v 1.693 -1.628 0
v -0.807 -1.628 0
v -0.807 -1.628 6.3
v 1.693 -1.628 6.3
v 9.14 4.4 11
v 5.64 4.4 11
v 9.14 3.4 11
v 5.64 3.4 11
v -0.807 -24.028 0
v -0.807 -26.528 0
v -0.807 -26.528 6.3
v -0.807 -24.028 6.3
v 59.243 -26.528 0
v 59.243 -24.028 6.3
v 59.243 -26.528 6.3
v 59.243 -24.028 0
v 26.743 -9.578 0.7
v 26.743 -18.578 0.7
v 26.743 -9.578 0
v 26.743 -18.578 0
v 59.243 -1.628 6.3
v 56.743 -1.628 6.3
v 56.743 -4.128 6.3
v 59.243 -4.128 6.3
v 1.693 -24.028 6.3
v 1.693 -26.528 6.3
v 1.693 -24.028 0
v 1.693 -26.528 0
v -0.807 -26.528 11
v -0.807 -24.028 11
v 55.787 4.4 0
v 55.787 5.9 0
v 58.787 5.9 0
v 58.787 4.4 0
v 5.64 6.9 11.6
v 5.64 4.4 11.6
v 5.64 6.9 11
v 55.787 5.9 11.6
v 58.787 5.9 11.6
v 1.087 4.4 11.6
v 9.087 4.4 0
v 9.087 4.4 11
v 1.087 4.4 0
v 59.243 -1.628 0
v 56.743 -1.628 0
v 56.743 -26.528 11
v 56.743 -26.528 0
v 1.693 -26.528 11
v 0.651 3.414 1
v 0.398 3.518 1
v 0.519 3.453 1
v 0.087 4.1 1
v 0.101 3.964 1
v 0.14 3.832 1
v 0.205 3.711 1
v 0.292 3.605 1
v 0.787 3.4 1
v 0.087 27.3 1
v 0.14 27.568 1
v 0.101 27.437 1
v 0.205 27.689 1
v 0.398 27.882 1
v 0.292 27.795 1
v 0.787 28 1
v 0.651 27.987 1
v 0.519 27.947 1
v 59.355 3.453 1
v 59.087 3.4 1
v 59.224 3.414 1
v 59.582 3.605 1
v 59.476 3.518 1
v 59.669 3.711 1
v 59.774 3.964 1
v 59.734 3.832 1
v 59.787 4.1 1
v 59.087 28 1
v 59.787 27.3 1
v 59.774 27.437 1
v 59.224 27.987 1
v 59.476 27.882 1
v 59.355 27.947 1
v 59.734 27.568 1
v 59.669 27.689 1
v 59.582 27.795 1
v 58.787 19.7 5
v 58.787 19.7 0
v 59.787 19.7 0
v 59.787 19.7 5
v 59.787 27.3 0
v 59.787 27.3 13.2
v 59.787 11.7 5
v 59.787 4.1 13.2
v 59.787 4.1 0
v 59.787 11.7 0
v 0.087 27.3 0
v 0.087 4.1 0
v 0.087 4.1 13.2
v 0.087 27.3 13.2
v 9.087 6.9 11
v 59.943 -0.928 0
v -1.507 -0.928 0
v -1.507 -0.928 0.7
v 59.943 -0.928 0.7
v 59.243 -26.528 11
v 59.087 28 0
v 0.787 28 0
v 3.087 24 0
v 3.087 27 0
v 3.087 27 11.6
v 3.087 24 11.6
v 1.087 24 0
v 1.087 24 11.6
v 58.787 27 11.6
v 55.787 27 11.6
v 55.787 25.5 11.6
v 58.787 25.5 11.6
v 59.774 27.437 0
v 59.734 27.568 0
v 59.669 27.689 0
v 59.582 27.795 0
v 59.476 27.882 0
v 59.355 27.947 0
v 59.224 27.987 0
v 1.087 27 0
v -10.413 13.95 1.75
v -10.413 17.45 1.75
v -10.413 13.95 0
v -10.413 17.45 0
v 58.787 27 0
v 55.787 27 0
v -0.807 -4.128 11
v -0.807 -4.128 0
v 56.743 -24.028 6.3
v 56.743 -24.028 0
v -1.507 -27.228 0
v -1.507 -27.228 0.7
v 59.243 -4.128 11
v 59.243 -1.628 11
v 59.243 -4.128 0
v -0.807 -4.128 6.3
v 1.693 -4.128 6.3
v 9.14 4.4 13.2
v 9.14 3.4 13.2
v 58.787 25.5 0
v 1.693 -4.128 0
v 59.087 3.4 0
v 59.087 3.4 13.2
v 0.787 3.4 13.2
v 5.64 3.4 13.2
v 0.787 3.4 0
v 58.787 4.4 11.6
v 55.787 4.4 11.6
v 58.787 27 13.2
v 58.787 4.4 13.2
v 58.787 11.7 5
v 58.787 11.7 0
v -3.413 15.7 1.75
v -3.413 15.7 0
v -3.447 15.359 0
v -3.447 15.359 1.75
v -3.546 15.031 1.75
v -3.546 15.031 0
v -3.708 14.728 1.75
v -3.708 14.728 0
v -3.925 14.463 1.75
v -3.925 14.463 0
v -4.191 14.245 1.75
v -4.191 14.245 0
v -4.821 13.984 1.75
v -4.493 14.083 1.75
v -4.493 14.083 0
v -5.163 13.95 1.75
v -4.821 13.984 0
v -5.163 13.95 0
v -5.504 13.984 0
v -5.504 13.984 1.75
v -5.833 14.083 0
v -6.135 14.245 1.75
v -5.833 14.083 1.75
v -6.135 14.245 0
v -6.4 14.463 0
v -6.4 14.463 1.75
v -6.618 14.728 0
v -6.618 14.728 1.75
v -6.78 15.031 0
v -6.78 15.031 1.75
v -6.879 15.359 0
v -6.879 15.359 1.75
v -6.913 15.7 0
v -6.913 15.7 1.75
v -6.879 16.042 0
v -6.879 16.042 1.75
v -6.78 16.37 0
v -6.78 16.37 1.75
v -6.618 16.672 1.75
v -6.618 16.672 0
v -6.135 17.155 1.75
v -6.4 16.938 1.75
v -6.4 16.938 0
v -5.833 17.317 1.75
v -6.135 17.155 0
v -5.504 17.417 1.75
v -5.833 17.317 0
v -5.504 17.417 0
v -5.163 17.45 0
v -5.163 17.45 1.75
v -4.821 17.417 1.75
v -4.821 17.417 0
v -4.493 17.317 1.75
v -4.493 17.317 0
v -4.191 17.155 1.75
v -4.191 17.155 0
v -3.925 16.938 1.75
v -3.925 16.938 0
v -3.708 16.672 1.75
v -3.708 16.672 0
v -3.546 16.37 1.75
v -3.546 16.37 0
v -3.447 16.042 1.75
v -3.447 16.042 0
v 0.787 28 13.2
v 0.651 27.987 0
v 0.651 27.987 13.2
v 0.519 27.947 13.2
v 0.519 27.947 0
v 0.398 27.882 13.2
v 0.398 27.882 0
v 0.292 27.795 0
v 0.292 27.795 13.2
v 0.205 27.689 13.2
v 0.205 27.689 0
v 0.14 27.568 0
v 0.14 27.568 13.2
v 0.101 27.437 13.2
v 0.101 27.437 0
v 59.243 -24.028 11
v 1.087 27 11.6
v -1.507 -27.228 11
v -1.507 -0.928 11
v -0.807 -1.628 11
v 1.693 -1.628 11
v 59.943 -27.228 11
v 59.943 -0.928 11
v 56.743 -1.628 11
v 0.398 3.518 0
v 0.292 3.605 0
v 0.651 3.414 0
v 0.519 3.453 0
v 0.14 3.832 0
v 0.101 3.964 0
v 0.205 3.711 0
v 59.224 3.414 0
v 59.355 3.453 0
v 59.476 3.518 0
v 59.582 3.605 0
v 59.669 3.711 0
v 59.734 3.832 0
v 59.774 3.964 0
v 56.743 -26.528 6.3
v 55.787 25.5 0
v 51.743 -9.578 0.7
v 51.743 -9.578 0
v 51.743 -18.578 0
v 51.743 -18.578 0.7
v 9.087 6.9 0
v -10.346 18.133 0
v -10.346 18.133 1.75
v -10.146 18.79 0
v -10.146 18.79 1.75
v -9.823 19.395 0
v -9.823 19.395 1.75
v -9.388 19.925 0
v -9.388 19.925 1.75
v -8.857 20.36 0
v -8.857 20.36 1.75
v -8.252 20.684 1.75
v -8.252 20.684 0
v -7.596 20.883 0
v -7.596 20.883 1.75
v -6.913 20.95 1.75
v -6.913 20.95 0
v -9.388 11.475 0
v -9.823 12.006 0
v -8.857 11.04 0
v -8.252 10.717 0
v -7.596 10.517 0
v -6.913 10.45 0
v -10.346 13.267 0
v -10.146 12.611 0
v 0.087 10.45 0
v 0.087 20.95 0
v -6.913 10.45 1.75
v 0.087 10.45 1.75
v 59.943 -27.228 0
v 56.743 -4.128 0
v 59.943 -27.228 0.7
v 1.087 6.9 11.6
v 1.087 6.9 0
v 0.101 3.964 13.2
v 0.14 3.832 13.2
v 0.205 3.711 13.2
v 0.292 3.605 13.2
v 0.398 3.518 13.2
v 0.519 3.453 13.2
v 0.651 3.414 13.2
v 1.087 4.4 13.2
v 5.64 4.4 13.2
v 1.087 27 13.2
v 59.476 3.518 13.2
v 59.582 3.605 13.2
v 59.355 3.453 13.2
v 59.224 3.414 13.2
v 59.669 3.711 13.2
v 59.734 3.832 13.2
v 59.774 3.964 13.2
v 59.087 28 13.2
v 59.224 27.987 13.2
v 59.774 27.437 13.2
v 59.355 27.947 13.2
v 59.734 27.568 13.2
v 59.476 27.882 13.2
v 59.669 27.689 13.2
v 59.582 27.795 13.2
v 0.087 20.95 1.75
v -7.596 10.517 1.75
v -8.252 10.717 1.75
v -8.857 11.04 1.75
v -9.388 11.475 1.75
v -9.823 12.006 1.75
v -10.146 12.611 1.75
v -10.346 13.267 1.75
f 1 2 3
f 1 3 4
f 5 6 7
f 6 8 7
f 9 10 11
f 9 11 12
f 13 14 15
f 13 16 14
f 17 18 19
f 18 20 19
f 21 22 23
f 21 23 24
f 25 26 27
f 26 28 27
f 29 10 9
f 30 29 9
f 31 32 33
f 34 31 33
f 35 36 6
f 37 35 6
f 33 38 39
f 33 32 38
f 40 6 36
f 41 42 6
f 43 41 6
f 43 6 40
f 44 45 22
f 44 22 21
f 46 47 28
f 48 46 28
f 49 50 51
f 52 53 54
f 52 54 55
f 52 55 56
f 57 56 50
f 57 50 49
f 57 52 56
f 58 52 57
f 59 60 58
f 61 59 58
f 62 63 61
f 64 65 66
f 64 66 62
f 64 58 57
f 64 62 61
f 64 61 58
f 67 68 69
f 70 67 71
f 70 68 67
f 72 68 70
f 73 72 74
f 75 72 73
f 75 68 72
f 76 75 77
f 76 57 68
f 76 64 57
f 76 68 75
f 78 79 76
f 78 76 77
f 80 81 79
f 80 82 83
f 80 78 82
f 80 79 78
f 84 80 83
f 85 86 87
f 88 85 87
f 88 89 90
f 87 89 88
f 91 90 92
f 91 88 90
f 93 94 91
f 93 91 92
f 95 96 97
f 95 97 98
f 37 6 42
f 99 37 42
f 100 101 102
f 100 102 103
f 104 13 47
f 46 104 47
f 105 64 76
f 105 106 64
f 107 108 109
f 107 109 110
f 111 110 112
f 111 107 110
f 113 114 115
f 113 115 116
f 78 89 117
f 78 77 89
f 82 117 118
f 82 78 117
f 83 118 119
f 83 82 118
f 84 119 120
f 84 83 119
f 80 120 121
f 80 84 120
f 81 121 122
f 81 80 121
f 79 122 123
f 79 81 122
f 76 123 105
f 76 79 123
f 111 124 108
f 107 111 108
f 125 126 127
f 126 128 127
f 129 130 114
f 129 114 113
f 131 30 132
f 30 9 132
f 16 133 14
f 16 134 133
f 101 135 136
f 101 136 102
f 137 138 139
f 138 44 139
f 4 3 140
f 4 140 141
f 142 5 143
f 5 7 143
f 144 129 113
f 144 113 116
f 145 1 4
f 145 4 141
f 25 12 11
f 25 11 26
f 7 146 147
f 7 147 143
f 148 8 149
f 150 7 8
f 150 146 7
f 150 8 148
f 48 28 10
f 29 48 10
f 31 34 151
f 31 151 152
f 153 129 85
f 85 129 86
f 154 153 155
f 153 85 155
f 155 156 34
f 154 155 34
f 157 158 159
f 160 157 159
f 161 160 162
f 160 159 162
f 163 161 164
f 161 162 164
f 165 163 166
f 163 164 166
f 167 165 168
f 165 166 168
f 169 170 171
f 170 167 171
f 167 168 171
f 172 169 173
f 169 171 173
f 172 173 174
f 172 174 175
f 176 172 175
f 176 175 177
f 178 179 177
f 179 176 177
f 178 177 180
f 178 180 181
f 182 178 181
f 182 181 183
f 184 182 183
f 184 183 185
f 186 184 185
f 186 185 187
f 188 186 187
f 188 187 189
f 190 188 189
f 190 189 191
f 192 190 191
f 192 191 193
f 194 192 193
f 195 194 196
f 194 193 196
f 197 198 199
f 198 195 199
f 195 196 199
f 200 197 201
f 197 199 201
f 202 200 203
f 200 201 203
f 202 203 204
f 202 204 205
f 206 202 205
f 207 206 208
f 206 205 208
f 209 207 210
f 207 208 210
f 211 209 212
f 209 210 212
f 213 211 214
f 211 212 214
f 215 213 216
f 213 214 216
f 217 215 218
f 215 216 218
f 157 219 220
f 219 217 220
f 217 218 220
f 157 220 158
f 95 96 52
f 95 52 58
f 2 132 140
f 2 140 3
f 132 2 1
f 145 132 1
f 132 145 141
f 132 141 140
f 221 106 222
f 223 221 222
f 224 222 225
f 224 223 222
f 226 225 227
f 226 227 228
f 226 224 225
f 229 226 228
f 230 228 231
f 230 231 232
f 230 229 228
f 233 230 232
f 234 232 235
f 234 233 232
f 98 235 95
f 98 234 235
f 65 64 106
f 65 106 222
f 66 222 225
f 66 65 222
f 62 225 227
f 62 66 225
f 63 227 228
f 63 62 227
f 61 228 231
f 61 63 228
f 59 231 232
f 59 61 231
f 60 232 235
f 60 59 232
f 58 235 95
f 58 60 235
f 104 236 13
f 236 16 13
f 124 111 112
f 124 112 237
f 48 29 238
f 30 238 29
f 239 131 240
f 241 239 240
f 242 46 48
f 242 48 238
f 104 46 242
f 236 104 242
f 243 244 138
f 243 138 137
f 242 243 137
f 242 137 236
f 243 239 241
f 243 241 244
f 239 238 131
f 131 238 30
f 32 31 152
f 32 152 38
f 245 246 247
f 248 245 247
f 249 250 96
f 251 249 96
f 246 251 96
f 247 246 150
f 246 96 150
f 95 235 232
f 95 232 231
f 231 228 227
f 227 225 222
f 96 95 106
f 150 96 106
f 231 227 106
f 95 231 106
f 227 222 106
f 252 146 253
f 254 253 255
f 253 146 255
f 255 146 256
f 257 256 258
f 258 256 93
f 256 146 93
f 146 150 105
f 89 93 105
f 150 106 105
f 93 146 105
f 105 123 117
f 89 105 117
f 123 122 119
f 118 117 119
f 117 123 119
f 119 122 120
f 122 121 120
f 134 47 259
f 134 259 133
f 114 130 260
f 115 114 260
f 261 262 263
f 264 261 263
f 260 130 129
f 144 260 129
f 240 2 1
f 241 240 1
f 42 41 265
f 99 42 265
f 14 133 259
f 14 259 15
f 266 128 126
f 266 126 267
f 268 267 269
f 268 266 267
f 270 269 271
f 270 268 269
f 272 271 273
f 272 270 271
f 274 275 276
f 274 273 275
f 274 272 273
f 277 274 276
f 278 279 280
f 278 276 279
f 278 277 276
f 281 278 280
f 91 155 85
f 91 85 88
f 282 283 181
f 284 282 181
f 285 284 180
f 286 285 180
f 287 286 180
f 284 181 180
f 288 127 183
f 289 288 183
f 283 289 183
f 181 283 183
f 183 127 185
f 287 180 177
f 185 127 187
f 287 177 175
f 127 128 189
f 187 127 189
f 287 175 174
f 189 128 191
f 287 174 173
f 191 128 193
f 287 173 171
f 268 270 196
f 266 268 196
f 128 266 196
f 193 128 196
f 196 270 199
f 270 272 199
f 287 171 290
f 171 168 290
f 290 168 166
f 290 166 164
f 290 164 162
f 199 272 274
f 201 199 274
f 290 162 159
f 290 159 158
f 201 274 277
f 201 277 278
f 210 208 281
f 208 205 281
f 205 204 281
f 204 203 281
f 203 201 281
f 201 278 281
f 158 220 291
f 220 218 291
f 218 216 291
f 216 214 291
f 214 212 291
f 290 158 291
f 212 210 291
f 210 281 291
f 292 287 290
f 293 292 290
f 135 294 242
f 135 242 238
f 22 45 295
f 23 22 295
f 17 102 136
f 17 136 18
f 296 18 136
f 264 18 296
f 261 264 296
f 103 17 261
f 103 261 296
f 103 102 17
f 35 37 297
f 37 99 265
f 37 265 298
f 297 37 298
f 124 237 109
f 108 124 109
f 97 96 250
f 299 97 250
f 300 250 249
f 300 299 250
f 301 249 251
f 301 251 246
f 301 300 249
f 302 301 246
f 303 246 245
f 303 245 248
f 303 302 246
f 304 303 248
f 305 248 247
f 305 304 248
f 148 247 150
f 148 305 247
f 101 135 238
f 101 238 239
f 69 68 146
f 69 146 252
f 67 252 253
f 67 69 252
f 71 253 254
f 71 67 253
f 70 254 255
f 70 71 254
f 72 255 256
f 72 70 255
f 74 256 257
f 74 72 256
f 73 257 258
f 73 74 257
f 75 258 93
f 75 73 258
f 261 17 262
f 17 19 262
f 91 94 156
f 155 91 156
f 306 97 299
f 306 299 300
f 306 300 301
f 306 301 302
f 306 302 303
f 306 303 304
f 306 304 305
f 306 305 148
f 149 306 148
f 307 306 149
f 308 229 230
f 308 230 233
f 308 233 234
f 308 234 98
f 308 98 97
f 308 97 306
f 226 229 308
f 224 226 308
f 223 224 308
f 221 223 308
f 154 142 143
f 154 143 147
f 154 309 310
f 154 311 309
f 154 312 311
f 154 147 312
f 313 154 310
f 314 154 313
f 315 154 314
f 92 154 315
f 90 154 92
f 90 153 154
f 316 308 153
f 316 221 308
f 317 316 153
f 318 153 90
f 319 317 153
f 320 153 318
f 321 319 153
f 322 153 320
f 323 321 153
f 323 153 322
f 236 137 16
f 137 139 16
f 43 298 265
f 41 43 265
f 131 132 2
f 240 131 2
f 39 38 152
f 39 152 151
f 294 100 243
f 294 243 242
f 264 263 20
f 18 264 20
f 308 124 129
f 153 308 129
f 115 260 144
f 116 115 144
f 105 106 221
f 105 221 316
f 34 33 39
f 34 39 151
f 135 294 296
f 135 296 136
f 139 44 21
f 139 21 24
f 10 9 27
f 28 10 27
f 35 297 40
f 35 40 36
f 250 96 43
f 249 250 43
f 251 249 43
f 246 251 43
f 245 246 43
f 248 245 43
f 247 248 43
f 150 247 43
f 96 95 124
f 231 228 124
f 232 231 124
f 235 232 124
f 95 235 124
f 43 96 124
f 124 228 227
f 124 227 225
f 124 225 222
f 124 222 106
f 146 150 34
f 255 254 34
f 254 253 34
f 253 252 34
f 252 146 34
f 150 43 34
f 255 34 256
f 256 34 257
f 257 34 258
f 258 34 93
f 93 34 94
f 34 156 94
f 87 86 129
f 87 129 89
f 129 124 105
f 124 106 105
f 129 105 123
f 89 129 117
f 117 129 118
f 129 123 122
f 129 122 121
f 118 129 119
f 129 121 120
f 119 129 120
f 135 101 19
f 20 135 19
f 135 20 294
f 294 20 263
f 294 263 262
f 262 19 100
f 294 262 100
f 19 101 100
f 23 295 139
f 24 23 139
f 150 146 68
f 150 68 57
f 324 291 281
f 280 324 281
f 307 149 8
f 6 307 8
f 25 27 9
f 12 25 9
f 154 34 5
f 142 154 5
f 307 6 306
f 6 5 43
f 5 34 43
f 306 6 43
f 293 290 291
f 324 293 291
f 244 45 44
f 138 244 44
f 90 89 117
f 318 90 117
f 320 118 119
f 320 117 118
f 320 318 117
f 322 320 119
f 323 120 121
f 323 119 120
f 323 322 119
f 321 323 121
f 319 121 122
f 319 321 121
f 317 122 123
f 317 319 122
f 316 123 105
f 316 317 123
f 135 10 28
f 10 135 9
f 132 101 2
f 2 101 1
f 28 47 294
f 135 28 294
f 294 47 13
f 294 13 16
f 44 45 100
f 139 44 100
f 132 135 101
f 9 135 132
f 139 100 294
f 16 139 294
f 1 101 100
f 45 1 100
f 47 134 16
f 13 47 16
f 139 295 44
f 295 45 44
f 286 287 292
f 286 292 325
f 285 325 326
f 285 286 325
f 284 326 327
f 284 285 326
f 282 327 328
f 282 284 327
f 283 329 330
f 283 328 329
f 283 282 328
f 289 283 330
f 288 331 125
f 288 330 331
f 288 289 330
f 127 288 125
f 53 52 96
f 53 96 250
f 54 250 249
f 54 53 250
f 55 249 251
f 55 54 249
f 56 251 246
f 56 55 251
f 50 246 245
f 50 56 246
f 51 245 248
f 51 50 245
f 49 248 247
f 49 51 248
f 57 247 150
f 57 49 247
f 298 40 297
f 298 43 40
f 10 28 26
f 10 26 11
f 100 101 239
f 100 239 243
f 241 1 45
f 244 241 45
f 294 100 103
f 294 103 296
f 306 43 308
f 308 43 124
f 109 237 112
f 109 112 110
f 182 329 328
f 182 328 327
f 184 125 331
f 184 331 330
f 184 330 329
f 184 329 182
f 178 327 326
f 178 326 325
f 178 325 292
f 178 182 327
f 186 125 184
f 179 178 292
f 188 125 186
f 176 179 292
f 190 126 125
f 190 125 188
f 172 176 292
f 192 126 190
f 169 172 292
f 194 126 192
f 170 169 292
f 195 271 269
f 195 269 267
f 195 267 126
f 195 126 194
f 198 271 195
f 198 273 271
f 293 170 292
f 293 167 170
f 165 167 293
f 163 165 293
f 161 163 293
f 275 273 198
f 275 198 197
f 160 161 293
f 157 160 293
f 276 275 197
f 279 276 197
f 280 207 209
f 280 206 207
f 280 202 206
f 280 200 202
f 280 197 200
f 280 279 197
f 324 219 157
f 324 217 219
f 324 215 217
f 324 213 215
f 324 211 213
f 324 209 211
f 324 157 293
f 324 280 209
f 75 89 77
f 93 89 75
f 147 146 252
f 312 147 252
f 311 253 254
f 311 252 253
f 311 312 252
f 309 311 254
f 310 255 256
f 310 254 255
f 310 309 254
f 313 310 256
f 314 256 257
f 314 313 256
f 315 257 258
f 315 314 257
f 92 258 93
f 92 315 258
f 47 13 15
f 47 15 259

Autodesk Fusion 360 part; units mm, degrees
sketch "Skizze1" plane through (0, 0, 0) normal (0, 0, 1) x (1, 0, 0)
  line L0 (0.0871, 28.0002) -> (59.7871, 28.0002)
  line L1 (59.7871, 28.0002) -> (59.7871, 3.4002)
  line L2 (59.7871, 3.4002) -> (0.0871, 3.4002)
  line L3 (0.0871, 3.4002) -> (0.0871, 28.0002)
  line L4 (58.7871, 4.4002) -> (1.0871, 4.4002)
  line L5 (1.0871, 4.4002) -> (1.0871, 27.0002)
  line L6 (1.0871, 27.0002) -> (58.7871, 27.0002)
  line L7 (58.7871, 27.0002) -> (58.7871, 4.4002)
  line L8 (1.0871, 27.0002) -> (3.0871, 27.0002)
  line L9 (3.0871, 27.0002) -> (3.0871, 24.0002)
  line L10 (3.0871, 24.0002) -> (1.0871, 24.0002)
  line L11 (1.0871, 24.0002) -> (1.0871, 27.0002)
  line L12 (1.0871, 4.4002) -> (9.0871, 4.4002)
  line L13 (9.0871, 4.4002) -> (9.0871, 6.9002)
  line L14 (9.0871, 6.9002) -> (1.0871, 6.9002)
  line L15 (1.0871, 6.9002) -> (1.0871, 4.4002)
  line L16 (58.7871, 27.0002) -> (55.7871, 27.0002)
  line L17 (55.7871, 27.0002) -> (55.7871, 25.5002)
  line L18 (55.7871, 25.5002) -> (58.7871, 25.5002)
  line L19 (58.7871, 25.5002) -> (58.7871, 27.0002)
  line L20 (58.7871, 4.4002) -> (55.7871, 4.4002)
  line L21 (55.7871, 4.4002) -> (55.7871, 5.9002)
  line L22 (55.7871, 5.9002) -> (58.7871, 5.9002)
  line L23 (58.7871, 5.9002) -> (58.7871, 4.4002)
  line L24 (58.7871, 19.7002) -> (59.7871, 19.7002)
  line L25 (59.7871, 19.7002) -> (59.7871, 11.7002)
  line L26 (59.7871, 11.7002) -> (58.7871, 11.7002)
  line L27 (58.7871, 11.7002) -> (58.7871, 19.7002)
  circle A0 centre (-5.1629, 15.7002) radius 1.75
  line L28 (0.0871, 20.9502) -> (-6.9129, 20.9502)
  line L29 (-10.4129, 17.4502) -> (-10.4129, 13.9502)
  line L30 (-6.9129, 10.4502) -> (0.0871, 10.4502)
  line L31 (0.0871, 10.4502) -> (0.0871, 20.9502)
  arc A1 (-6.9129, 20.9502) -> (-10.4129, 17.4502) centre (-6.9129, 17.4502) ccw
  arc A2 (-10.4129, 13.9502) -> (-6.9129, 10.4502) centre (-6.9129, 13.9502) ccw
  point P0 (-10.4129, 20.9502)
  point P1 (-5.1629, 20.9502)
  point P2 (-10.4129, 15.7002)
  point P3 (0.0871, 15.7002)
  dimension "d1" = 59.7
  dimension "d2" = 24.6
  dimension "d3" = 1
  dimension "d4" = 2
  dimension "d5" = 3
  dimension "d6" = 8
  dimension "d7" = 2.5
  dimension "d8" = 3
  dimension "d9" = 1.5
  dimension "d10" = 3
  dimension "d11" = 1.5
  dimension "d12" = 1
  dimension "d13" = 8
  dimension "d14" = 8.3
  dimension "d57" = 3.5
  dimension "d58" = 10.5
  dimension "d59" = 10.5
  dimension "d60" = 3.5
extrude "Extrusion1" add sketch "Skizze1" along normal blind 1 contours L0 L1 L2 L3 L4 L5 L6 L7 L8 L11 L12 L15 L16 L19 L20 L23 L24 L26 L31 | L1 L7 L24 L25 L26 L27 | L4 L5 L6 L7 L9 L10 L13 L14 L17 L18 L21 L22 L27 | L6 L7 L16 L17 L18 L19 | L4 L7 L20 L21 L22 L23 | L5 L6 L8 L9 L10 L11 | L4 L5 L12 L13 L14 L15 makes body 1
extrude "Extrusion3" add sketch "Skizze1" along normal blind 13.2 separate body contours L0 L1 L2 L3 L4 L5 L6 L7 L8 L11 L12 L15 L16 L19 L20 L23 L24 L26 L31 | L1 L7 L24 L25 L26 L27 makes body 2
extrude "Extrusion4" cut sketch "Skizze1" along normal blind 5 contours L1 L7 L24 L25 L26 L27 bodies 2
sketch "Skizze2" plane through (0, 0, 0) normal (0, 0, 1) x (1, 0, 0)
  line L0 (59.9433, -27.2284) -> (-1.5067, -27.2284)
  line L1 (-1.5067, -27.2284) -> (-1.5067, -0.9284)
  line L2 (-1.5067, -0.9284) -> (59.9433, -0.9284)
  line L3 (59.9433, -0.9284) -> (59.9433, -27.2284)
  line L4 (-0.8067, -1.6284) -> (59.2433, -1.6284)
  line L5 (59.2433, -1.6284) -> (59.2433, -26.5284)
  line L6 (59.2433, -26.5284) -> (-0.8067, -26.5284)
  line L7 (-0.8067, -26.5284) -> (-0.8067, -1.6284)
  line L8 (26.7433, -9.5784) -> (51.7433, -9.5784)
  line L9 (51.7433, -9.5784) -> (51.7433, -18.5784)
  line L10 (51.7433, -18.5784) -> (26.7433, -18.5784)
  line L11 (26.7433, -18.5784) -> (26.7433, -9.5784)
  line L12 (-0.8067, -1.6284) -> (1.6933, -1.6284)
  line L13 (1.6933, -1.6284) -> (1.6933, -4.1284)
  line L14 (1.6933, -4.1284) -> (-0.8067, -4.1284)
  line L15 (-0.8067, -4.1284) -> (-0.8067, -1.6284)
  line L16 (-0.8067, -26.5284) -> (1.6933, -26.5284)
  line L17 (1.6933, -26.5284) -> (1.6933, -24.0284)
  line L18 (1.6933, -24.0284) -> (-0.8067, -24.0284)
  line L19 (-0.8067, -24.0284) -> (-0.8067, -26.5284)
  line L20 (59.2433, -1.6284) -> (56.7433, -1.6284)
  line L21 (56.7433, -1.6284) -> (56.7433, -4.1284)
  line L22 (56.7433, -4.1284) -> (59.2433, -4.1284)
  line L23 (59.2433, -4.1284) -> (59.2433, -1.6284)
  line L24 (59.2433, -26.5284) -> (56.7433, -26.5284)
  line L25 (56.7433, -26.5284) -> (56.7433, -24.0284)
  line L26 (56.7433, -24.0284) -> (59.2433, -24.0284)
  line L27 (59.2433, -24.0284) -> (59.2433, -26.5284)
  dimension "d23" = 61.45
  dimension "d24" = 26.3
  dimension "d26" = 0.7
  dimension "d27" = 25
  dimension "d28" = 9
  dimension "d29" = 8.65
  dimension "d30" = 7.5
  dimension "d37" = 2.5
  dimension "d38" = 2.5
  dimension "d39" = 2.5
  dimension "d40" = 2.5
  dimension "d41" = 2.5
  dimension "d42" = 2.5
  dimension "d43" = 2.5
  dimension "d44" = 2.5
  dimension "d63" = 24.5
  dimension "d64" = 59.5
  dimension "d65" = 7.4
extrude "Extrusion5" add sketch "Skizze2" along normal blind 0.7 separate body contours L0 L1 L2 L3 | L4 L7 L12 L13 L14 L15 | L4 L5 L6 L7 L13 L14 L17 L18 L21 L22 L25 L26 | L4 L5 L20 L21 L22 L23 | L6 L7 L16 L17 L18 L19 | L5 L6 L24 L25 L26 L27 makes body 3
extrude "Extrusion6" add sketch "Skizze2" along normal blind 11 separate body contours L0 L1 L2 L3 makes body 4
extrude "Extrusion7" add sketch "Skizze1" along normal blind 11.6 separate body contours L6 L7 L16 L17 L18 L19 | L4 L7 L20 L21 L22 L23 | L5 L6 L8 L9 L10 L11 | L4 L5 L12 L13 L14 L15 makes body 5 at (56.7871, 27.0002, 3.8667) makes body 6 at (57.7871, 4.4002, 3.8667) makes body 7 at (1.0871, 25.0002, 3.8667) makes body 8 at (6.4204, 6.9002, 3.8667)
extrude "Extrusion8" add sketch "Skizze2" along normal blind 6.3 separate body contours L4 L7 L12 L13 L14 L15 | L4 L5 L20 L21 L22 L23 | L6 L7 L16 L17 L18 L19 | L5 L6 L24 L25 L26 L27 makes body 9 at (0.0266, -1.6284, 2.1) makes body 10 at (0.86, -24.0284, 2.1) makes body 11 at (59.2433, -2.4617, 2.1) makes body 12 at (58.41, -26.5284, 2.1)
fillet "Abrundung1" radius 0.7 1 edges at (0.0871, 28.0002, 6.6) on bodies 2
fillet "Abrundung2" radius 0.7 1 edges at (0.0871, 28.0002, 0.5) on bodies 1
fillet "Abrundung3" radius 0.7 2 edges at (0.0871, 3.4002, 0.5) (0.0871, 3.4002, 6.6) on bodies 1 2
fillet "Abrundung4" radius 0.7 1 edges at (59.7871, 28.0002, 6.6) on bodies 2
fillet "Abrundung5" radius 0.7 1 edges at (59.7871, 28.0002, 0.5) on bodies 1
fillet "Abrundung6" radius 0.7 2 edges at (59.7871, 3.4002, 0.5) (59.7871, 3.4002, 6.6) on bodies 1 2
sketch "Skizze3" plane through (0, 3.4002, 0) normal (0, -1, 0) x (1, 0, 0)
  line L0 (59.0871, 0) -> (59.0871, 13.2)
  line L1 (59.0871, 13.2) -> (0.7871, 13.2)
  line L2 (0.7871, 13.2) -> (0.7871, 0)
  line L3 (0.7871, 0) -> (59.0871, 0)
  line L4 (9.1398, 13.2) -> (5.6398, 13.2)
  line L5 (5.6398, 13.2) -> (5.6398, 11)
  line L6 (5.6398, 11) -> (9.1398, 11)
  line L7 (9.1398, 11) -> (9.1398, 13.2)
  dimension "d53" = 3.5
  dimension "d54" = 2.2
extrude "Extrusion9" cut sketch "Skizze3" against normal blind 4 contours L1 L4 L5 L6 L7 bodies 2 8
extrude "Extrusion10" add sketch "Skizze1" along normal blind 1.75 separate body contours L3 L28 L29 L30 L31 A1 A2 makes body 13
equation "d19 = 11.6 mm + 1.6 mm"
equation "d23 = 59.7 mm + 1.75 mm"
equation "d24 = 24.5 mm + 1.8 mm"
equation "d30 = 6.8 mm + 0.7 mm"
equation "d45 = 5.6 mm + 0.7 mm"
